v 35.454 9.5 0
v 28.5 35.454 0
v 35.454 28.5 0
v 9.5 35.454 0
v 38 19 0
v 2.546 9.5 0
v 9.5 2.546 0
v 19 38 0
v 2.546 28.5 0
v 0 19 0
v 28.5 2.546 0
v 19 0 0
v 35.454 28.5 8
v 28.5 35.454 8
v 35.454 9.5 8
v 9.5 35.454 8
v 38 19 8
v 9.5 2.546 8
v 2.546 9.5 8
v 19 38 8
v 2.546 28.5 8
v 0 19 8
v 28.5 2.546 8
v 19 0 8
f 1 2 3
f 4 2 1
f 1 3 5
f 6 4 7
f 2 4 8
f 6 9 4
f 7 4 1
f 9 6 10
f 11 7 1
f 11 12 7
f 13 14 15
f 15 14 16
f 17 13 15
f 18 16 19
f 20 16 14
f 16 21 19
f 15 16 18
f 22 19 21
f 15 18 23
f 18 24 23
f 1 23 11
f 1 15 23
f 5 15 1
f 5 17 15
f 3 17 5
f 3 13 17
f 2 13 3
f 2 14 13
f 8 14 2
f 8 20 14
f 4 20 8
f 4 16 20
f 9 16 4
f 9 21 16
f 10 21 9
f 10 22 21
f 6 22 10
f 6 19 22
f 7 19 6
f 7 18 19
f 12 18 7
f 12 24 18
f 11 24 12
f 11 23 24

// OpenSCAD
$fn = 32;

// ----------------------------------------------------------------------
// Eccentric disc: egg, 8 mm thick
// ----------------------------------------------------------------------

// --- parameters (mm) ---
profile_height = 8;       // extrusion height
profile_points = 12;      // points of the closed outline

profile = [[0, 19], [2.546, 9.5], [9.5, 2.546], [19, 0], [28.5, 2.546], [35.454, 9.5], [38, 19], [35.454, 28.5], [28.5, 35.454], [19, 38], [9.5, 35.454], [2.546, 28.5]];  // single closed polygon, 12 points, counter clockwise

// --- the one profile operation ---
linear_extrude(height = profile_height) polygon(points = profile);
